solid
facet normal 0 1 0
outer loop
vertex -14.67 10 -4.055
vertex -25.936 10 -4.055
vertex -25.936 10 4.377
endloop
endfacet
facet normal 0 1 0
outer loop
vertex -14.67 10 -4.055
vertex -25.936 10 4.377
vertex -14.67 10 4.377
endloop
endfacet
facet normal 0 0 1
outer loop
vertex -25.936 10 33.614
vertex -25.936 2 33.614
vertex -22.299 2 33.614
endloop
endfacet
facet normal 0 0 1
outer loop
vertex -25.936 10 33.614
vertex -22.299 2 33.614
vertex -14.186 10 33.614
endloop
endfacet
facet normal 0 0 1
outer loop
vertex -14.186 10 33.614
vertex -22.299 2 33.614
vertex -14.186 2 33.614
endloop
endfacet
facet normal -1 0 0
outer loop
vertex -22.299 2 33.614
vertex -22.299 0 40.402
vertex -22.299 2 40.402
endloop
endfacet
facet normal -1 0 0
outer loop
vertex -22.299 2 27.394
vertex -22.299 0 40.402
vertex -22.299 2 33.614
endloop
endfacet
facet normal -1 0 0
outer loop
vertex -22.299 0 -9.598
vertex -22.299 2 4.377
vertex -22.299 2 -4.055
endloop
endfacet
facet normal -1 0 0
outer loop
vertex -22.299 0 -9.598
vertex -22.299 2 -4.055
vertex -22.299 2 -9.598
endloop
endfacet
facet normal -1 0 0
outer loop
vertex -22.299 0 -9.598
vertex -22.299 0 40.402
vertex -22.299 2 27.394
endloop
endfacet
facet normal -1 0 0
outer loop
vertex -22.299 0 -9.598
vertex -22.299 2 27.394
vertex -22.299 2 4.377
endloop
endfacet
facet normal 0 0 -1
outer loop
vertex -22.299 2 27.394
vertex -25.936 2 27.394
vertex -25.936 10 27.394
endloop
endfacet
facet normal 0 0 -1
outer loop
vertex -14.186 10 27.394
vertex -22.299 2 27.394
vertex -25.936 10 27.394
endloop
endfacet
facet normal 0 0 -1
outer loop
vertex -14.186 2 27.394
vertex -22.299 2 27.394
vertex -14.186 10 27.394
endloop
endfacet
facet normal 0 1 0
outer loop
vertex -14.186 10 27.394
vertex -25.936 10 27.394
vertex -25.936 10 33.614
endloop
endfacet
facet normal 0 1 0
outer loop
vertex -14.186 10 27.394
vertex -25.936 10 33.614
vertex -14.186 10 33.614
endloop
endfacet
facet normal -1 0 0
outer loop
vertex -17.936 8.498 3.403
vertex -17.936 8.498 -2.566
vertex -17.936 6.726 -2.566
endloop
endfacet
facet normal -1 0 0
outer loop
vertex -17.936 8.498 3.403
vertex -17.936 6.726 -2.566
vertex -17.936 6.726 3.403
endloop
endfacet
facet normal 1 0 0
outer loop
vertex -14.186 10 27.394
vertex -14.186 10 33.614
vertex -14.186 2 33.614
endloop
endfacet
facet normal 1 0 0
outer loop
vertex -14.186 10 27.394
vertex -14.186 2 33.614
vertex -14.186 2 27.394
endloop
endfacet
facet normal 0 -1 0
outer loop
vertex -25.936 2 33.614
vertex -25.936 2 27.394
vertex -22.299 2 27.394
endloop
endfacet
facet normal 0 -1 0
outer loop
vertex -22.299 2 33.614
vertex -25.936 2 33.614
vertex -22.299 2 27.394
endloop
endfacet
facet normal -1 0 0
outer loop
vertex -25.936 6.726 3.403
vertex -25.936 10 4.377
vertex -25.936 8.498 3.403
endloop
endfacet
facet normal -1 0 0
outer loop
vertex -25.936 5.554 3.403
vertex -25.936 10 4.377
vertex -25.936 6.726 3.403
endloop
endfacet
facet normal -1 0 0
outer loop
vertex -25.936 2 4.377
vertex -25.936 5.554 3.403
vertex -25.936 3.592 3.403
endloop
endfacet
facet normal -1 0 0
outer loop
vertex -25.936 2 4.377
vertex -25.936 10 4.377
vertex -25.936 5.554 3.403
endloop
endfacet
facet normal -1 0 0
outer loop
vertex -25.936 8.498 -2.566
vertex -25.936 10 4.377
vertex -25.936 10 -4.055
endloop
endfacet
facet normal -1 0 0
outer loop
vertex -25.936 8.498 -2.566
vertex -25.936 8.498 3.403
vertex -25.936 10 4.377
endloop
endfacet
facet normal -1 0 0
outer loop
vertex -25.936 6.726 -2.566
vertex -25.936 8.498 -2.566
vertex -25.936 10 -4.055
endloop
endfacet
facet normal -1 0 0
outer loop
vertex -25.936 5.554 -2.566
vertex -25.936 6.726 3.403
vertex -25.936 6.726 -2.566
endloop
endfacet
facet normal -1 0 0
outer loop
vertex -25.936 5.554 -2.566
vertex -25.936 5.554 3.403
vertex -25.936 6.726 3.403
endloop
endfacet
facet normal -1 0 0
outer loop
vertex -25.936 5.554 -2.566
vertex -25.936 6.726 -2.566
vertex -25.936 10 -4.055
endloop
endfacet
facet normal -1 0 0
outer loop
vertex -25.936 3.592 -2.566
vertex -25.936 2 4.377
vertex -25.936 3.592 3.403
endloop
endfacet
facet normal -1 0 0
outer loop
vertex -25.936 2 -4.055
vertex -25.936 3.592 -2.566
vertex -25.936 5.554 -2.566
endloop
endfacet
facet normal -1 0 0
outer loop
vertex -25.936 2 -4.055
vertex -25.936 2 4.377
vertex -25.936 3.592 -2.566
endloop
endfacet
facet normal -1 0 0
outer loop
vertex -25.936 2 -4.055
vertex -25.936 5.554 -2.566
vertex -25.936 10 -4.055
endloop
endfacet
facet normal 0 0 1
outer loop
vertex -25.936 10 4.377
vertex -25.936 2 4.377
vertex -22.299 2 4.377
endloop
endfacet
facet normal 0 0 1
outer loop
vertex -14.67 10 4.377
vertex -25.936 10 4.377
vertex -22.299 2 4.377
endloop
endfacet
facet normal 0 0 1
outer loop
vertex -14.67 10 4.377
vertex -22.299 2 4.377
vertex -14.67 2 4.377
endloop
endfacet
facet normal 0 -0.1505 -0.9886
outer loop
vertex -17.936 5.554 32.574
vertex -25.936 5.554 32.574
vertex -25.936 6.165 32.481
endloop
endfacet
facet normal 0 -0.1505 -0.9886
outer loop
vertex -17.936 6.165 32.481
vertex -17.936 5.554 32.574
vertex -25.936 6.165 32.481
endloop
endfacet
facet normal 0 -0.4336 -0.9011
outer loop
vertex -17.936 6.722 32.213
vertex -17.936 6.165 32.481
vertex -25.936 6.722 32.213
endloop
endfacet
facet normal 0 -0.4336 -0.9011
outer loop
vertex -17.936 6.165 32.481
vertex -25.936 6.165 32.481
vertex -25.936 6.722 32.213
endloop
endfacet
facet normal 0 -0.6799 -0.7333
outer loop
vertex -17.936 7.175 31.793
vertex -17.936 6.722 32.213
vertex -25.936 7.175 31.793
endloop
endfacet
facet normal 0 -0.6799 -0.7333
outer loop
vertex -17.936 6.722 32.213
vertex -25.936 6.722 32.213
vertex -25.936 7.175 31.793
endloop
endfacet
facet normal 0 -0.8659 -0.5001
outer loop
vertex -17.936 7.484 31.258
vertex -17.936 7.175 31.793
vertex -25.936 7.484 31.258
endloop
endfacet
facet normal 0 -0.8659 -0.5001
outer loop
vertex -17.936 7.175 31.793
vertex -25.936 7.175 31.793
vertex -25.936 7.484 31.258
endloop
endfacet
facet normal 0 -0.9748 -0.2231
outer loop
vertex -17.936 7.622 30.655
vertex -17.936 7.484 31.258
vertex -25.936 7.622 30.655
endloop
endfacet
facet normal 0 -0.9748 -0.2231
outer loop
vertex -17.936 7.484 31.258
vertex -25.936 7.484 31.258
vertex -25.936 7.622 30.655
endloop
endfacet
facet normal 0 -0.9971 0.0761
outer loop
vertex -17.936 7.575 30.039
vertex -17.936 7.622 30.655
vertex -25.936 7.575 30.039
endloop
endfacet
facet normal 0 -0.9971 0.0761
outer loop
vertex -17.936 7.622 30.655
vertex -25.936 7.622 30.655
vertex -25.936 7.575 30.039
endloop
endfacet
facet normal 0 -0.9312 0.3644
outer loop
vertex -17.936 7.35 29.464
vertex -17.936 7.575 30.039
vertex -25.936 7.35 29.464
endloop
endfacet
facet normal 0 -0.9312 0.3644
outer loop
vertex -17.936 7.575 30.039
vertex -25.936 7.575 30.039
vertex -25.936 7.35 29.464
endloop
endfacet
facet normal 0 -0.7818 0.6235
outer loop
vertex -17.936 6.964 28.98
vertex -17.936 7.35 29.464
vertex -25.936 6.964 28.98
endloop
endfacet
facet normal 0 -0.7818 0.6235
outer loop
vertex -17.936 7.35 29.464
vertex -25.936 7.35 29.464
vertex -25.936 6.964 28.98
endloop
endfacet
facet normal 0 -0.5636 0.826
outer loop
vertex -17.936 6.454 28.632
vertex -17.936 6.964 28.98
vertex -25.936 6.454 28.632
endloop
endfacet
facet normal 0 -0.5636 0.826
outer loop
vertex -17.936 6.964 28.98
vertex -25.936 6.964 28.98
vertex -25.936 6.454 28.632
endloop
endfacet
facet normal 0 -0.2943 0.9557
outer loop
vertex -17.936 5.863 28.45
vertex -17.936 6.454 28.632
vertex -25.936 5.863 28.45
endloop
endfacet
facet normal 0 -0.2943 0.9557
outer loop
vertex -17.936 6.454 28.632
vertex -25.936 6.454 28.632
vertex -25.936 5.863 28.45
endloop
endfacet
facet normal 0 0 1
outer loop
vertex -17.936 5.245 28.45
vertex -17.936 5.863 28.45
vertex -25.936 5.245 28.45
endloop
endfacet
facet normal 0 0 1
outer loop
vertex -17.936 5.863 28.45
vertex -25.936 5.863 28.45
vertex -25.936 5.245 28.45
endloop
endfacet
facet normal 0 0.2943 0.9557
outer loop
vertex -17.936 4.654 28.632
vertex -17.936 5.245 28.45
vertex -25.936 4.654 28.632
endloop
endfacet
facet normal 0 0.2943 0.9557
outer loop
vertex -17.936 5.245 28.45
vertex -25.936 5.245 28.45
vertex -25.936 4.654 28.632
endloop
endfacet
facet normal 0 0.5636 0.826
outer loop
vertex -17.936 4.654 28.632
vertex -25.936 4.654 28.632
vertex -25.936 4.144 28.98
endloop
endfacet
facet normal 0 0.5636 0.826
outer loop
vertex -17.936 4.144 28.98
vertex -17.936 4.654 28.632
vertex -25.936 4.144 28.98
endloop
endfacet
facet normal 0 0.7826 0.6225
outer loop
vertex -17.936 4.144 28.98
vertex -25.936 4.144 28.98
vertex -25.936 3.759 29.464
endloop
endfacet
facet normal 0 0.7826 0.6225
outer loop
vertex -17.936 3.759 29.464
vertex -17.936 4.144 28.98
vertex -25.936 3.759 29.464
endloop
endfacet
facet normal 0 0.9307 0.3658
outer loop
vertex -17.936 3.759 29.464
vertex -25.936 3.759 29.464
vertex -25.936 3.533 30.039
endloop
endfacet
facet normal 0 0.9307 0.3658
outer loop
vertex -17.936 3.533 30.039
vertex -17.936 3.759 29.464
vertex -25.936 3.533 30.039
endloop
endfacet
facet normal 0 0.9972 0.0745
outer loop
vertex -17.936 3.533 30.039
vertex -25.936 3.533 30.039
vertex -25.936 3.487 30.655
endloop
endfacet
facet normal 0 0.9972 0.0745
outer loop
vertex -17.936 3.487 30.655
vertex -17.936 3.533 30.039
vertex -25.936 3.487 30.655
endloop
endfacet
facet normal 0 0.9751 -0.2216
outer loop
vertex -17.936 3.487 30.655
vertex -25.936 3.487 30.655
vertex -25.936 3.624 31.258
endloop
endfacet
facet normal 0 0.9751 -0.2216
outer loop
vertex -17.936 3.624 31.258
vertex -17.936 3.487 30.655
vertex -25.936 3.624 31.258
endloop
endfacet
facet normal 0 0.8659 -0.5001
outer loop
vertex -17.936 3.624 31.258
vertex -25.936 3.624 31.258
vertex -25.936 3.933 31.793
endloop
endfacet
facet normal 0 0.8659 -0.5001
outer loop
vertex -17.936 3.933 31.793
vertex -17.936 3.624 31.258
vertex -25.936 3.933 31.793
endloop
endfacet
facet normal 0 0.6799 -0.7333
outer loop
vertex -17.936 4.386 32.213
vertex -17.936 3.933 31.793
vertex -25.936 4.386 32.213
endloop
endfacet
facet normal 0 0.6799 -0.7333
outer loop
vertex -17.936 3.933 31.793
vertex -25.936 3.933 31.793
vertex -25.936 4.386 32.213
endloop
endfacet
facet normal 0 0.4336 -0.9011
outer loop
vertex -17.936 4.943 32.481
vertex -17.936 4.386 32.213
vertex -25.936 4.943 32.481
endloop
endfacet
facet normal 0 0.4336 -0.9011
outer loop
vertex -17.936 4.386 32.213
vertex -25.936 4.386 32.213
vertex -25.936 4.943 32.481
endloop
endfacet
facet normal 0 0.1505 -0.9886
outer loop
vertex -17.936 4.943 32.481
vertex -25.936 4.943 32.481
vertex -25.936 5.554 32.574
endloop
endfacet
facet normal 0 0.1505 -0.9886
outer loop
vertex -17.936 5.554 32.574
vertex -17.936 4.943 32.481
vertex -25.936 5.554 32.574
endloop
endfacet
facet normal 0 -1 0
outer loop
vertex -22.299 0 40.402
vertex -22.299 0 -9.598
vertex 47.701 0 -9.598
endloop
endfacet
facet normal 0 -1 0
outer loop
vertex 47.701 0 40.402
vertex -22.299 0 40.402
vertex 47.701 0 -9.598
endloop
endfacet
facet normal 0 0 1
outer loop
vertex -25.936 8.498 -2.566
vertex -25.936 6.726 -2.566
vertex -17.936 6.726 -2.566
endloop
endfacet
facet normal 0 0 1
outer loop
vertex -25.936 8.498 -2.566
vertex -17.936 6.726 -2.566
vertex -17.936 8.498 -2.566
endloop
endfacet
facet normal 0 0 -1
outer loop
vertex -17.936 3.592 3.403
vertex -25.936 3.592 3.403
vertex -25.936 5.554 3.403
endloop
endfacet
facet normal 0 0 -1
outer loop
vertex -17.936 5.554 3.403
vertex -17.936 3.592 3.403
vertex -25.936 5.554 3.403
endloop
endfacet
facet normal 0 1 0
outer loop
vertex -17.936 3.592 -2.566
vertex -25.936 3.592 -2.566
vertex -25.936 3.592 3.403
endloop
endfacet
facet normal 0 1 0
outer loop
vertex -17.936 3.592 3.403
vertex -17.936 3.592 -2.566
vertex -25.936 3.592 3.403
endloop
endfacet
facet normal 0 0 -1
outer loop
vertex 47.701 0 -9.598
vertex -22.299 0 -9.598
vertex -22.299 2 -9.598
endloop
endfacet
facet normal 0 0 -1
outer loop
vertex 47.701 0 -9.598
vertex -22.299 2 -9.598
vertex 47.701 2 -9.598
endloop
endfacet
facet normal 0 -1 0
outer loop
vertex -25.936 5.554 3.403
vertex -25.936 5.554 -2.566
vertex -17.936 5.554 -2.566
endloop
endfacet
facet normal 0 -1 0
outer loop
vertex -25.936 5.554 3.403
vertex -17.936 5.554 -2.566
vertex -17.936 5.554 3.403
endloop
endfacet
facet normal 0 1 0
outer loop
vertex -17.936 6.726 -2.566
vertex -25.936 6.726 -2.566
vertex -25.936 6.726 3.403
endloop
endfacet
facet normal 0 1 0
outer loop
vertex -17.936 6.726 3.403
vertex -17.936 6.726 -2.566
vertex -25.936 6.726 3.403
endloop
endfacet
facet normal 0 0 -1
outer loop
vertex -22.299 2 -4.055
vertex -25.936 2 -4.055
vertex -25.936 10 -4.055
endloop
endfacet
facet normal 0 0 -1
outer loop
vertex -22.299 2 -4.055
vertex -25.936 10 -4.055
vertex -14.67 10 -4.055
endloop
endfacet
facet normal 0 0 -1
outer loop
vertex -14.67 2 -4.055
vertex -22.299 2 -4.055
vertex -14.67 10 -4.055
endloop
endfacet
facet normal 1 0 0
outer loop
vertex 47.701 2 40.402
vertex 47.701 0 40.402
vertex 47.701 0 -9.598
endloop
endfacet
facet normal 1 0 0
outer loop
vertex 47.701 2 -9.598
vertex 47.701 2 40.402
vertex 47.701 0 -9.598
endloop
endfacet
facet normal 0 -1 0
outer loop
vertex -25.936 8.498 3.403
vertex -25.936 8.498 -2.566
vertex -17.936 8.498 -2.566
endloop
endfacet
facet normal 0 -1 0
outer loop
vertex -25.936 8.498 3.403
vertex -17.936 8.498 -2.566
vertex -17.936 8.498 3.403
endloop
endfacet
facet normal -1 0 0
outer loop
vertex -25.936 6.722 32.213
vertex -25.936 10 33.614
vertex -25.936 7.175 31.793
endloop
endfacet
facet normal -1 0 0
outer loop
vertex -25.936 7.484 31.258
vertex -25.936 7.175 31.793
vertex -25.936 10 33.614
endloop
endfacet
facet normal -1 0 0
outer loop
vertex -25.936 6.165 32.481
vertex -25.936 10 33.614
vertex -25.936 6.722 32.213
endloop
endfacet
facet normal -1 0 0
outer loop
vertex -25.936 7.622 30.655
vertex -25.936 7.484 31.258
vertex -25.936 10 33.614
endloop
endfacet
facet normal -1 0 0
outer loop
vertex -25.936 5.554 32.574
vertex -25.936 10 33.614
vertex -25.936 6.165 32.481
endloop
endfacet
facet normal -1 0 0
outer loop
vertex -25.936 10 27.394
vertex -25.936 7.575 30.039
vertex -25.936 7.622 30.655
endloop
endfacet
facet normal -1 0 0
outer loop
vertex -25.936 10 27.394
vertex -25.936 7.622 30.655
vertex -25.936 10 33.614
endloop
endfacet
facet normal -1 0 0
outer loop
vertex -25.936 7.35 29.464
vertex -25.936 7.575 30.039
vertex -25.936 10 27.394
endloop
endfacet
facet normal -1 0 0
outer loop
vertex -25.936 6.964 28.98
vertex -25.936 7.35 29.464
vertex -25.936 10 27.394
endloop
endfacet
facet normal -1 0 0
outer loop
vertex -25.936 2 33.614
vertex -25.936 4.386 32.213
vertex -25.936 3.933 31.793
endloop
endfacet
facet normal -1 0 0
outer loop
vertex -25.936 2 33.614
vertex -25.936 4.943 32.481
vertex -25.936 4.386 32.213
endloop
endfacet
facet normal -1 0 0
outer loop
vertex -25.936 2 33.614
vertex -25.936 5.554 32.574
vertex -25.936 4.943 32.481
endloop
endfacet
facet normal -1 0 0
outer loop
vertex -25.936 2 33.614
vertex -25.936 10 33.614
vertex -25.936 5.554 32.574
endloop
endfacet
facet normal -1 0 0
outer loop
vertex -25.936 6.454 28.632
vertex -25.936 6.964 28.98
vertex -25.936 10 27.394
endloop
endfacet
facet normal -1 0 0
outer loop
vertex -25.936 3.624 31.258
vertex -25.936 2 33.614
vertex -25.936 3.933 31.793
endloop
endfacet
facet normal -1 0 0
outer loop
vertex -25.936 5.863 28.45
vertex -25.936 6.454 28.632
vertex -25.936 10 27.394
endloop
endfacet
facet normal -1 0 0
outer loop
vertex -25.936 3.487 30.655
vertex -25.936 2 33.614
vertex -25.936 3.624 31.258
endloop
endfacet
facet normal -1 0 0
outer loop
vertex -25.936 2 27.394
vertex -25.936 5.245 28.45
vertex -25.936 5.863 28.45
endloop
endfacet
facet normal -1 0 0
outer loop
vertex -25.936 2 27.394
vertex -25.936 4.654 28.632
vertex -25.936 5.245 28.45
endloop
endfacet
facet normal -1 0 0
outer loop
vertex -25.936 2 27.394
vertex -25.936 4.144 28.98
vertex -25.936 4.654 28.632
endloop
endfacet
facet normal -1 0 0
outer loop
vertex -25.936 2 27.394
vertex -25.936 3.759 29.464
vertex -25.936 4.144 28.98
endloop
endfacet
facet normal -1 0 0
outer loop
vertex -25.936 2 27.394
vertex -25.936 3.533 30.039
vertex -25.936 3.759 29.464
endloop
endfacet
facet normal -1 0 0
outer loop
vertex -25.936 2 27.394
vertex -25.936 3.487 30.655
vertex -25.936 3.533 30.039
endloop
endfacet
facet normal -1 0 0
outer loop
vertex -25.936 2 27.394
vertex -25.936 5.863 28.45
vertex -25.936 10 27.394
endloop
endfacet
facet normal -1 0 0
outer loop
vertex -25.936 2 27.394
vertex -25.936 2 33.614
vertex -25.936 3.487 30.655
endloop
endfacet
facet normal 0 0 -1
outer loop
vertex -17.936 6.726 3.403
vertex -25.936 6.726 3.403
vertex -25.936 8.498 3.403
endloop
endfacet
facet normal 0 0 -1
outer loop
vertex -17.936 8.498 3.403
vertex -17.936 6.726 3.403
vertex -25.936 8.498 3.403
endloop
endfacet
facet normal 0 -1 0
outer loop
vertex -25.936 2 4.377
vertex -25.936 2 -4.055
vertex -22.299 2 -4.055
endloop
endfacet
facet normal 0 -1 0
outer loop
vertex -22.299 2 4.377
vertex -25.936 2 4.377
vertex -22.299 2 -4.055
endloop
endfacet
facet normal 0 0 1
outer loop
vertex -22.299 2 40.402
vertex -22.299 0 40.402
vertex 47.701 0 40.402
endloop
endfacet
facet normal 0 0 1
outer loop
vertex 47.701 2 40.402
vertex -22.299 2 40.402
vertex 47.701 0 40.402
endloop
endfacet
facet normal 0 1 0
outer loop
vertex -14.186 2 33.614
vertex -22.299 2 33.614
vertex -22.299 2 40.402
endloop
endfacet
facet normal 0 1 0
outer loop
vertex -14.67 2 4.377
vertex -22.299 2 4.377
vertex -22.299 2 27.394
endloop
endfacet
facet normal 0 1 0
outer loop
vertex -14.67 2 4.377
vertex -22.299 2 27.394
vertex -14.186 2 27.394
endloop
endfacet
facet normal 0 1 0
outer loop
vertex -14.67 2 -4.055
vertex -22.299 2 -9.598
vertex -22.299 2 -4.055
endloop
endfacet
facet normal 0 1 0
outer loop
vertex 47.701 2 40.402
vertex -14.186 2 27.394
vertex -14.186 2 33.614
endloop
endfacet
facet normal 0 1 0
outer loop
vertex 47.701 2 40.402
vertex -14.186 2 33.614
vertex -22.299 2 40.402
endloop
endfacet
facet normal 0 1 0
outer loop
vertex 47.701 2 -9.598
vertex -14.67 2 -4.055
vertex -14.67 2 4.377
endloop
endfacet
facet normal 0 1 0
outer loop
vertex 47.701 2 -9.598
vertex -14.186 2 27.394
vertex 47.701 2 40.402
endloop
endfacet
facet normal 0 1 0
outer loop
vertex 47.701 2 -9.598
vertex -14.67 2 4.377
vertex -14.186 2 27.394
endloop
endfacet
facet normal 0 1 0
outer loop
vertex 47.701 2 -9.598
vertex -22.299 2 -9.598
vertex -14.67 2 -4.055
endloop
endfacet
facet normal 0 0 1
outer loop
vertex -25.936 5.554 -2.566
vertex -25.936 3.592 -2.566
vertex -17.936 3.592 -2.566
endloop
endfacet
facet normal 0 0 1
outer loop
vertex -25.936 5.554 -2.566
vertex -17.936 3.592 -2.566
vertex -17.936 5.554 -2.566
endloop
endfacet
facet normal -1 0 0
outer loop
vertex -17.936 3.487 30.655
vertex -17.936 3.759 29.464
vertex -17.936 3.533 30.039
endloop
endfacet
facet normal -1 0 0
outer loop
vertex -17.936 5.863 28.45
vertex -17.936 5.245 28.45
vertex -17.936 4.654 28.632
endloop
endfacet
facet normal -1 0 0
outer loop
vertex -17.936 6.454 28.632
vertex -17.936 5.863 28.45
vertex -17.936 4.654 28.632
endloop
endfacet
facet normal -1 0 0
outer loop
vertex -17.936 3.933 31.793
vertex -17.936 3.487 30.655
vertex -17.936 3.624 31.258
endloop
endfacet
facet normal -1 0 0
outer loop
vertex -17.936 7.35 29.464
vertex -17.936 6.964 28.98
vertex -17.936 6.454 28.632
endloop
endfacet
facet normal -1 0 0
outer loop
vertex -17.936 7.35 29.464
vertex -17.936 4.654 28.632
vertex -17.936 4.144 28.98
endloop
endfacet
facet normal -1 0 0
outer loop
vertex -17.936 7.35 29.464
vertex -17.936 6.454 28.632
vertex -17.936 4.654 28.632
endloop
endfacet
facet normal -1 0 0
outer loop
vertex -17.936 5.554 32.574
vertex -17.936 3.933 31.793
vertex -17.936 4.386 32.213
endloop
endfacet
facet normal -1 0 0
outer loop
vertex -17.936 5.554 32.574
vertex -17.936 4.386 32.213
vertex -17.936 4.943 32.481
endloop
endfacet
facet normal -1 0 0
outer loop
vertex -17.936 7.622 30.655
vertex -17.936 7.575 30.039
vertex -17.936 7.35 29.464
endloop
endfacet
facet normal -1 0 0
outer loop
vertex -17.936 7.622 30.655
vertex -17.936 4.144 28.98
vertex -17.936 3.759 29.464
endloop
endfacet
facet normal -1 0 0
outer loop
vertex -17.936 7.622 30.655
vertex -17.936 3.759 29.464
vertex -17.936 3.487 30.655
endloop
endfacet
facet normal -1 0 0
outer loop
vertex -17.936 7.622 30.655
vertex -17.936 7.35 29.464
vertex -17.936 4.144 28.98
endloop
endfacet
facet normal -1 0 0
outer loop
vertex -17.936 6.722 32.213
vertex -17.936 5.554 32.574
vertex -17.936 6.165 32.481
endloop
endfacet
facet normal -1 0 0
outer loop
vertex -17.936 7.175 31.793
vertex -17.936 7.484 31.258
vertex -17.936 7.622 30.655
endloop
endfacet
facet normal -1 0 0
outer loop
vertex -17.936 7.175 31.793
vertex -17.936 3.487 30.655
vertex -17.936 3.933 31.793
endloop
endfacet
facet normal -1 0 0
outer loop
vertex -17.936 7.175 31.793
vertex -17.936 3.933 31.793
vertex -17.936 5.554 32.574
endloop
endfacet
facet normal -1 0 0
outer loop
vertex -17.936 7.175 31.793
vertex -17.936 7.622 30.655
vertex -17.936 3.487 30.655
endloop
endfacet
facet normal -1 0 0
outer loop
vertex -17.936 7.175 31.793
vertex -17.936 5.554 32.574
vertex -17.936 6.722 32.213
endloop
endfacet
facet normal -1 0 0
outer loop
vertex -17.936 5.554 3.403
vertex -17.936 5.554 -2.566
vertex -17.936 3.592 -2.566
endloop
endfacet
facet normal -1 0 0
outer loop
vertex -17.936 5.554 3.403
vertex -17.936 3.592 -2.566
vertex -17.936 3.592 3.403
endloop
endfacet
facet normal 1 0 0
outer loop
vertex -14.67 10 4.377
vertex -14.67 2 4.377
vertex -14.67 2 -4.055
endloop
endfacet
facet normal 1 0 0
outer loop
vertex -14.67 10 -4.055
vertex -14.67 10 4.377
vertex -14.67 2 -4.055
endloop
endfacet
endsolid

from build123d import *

# Parameters (mm, degrees)
SKETCH_1_W          = 70
SKETCH_1_H          = 50
EXTRUDE_1_DEPTH     = 2
SKETCH_2_W          = 11.266192233
SKETCH_2_H          = 8.432364739
SKETCH_2_W_2        = 11.75001644
SKETCH_2_H_2        = 6.220596939
EXTRUDE_2_DEPTH     = 8
SKETCH_3_R          = 2.073259277
SKETCH_3_W          = 5.968463231
SKETCH_3_H          = 1.961690003
SKETCH_3_H_2        = 1.772031982
CUT_EXTRUDE_1_DEPTH = 8


with BuildPart() as part:
    # 草图1 → 凸台-拉伸1 (new body)
    with BuildSketch(Plane(origin=(0, 0, 0), x_dir=(1, 0, 0), z_dir=(0, 1, 0))):
        with Locations((12.700831025, -15.40166205)):
            Rectangle(SKETCH_1_W, SKETCH_1_H)
    extrude(amount=EXTRUDE_1_DEPTH)

    # 草图2 → 凸台-拉伸2 (add)
    with BuildSketch(Plane(origin=(0, 2, 0), x_dir=(1, 0, 0), z_dir=(0, 1, 0))):
        with Locations((-20.302891623, -0.16119955)):
            Rectangle(SKETCH_2_W, SKETCH_2_H)
        with Locations((-20.060979519, -30.503889063)):
            Rectangle(SKETCH_2_W_2, SKETCH_2_H_2)
    extrude(amount=EXTRUDE_2_DEPTH)

    # 草图3 → 切除-拉伸1 (cut)
    with BuildSketch(Plane.ZY.offset(25.935987739)):
        with Locations((30.500300108, 5.554053281)):
            Circle(SKETCH_3_R)
        with Locations((0.41832149, 4.57320828)):
            Rectangle(SKETCH_3_W, SKETCH_3_H)
        with Locations((0.41832149, 7.612359017)):
            Rectangle(SKETCH_3_W, SKETCH_3_H_2)
    extrude(amount=-CUT_EXTRUDE_1_DEPTH, mode=Mode.SUBTRACT)


solid = part.part
